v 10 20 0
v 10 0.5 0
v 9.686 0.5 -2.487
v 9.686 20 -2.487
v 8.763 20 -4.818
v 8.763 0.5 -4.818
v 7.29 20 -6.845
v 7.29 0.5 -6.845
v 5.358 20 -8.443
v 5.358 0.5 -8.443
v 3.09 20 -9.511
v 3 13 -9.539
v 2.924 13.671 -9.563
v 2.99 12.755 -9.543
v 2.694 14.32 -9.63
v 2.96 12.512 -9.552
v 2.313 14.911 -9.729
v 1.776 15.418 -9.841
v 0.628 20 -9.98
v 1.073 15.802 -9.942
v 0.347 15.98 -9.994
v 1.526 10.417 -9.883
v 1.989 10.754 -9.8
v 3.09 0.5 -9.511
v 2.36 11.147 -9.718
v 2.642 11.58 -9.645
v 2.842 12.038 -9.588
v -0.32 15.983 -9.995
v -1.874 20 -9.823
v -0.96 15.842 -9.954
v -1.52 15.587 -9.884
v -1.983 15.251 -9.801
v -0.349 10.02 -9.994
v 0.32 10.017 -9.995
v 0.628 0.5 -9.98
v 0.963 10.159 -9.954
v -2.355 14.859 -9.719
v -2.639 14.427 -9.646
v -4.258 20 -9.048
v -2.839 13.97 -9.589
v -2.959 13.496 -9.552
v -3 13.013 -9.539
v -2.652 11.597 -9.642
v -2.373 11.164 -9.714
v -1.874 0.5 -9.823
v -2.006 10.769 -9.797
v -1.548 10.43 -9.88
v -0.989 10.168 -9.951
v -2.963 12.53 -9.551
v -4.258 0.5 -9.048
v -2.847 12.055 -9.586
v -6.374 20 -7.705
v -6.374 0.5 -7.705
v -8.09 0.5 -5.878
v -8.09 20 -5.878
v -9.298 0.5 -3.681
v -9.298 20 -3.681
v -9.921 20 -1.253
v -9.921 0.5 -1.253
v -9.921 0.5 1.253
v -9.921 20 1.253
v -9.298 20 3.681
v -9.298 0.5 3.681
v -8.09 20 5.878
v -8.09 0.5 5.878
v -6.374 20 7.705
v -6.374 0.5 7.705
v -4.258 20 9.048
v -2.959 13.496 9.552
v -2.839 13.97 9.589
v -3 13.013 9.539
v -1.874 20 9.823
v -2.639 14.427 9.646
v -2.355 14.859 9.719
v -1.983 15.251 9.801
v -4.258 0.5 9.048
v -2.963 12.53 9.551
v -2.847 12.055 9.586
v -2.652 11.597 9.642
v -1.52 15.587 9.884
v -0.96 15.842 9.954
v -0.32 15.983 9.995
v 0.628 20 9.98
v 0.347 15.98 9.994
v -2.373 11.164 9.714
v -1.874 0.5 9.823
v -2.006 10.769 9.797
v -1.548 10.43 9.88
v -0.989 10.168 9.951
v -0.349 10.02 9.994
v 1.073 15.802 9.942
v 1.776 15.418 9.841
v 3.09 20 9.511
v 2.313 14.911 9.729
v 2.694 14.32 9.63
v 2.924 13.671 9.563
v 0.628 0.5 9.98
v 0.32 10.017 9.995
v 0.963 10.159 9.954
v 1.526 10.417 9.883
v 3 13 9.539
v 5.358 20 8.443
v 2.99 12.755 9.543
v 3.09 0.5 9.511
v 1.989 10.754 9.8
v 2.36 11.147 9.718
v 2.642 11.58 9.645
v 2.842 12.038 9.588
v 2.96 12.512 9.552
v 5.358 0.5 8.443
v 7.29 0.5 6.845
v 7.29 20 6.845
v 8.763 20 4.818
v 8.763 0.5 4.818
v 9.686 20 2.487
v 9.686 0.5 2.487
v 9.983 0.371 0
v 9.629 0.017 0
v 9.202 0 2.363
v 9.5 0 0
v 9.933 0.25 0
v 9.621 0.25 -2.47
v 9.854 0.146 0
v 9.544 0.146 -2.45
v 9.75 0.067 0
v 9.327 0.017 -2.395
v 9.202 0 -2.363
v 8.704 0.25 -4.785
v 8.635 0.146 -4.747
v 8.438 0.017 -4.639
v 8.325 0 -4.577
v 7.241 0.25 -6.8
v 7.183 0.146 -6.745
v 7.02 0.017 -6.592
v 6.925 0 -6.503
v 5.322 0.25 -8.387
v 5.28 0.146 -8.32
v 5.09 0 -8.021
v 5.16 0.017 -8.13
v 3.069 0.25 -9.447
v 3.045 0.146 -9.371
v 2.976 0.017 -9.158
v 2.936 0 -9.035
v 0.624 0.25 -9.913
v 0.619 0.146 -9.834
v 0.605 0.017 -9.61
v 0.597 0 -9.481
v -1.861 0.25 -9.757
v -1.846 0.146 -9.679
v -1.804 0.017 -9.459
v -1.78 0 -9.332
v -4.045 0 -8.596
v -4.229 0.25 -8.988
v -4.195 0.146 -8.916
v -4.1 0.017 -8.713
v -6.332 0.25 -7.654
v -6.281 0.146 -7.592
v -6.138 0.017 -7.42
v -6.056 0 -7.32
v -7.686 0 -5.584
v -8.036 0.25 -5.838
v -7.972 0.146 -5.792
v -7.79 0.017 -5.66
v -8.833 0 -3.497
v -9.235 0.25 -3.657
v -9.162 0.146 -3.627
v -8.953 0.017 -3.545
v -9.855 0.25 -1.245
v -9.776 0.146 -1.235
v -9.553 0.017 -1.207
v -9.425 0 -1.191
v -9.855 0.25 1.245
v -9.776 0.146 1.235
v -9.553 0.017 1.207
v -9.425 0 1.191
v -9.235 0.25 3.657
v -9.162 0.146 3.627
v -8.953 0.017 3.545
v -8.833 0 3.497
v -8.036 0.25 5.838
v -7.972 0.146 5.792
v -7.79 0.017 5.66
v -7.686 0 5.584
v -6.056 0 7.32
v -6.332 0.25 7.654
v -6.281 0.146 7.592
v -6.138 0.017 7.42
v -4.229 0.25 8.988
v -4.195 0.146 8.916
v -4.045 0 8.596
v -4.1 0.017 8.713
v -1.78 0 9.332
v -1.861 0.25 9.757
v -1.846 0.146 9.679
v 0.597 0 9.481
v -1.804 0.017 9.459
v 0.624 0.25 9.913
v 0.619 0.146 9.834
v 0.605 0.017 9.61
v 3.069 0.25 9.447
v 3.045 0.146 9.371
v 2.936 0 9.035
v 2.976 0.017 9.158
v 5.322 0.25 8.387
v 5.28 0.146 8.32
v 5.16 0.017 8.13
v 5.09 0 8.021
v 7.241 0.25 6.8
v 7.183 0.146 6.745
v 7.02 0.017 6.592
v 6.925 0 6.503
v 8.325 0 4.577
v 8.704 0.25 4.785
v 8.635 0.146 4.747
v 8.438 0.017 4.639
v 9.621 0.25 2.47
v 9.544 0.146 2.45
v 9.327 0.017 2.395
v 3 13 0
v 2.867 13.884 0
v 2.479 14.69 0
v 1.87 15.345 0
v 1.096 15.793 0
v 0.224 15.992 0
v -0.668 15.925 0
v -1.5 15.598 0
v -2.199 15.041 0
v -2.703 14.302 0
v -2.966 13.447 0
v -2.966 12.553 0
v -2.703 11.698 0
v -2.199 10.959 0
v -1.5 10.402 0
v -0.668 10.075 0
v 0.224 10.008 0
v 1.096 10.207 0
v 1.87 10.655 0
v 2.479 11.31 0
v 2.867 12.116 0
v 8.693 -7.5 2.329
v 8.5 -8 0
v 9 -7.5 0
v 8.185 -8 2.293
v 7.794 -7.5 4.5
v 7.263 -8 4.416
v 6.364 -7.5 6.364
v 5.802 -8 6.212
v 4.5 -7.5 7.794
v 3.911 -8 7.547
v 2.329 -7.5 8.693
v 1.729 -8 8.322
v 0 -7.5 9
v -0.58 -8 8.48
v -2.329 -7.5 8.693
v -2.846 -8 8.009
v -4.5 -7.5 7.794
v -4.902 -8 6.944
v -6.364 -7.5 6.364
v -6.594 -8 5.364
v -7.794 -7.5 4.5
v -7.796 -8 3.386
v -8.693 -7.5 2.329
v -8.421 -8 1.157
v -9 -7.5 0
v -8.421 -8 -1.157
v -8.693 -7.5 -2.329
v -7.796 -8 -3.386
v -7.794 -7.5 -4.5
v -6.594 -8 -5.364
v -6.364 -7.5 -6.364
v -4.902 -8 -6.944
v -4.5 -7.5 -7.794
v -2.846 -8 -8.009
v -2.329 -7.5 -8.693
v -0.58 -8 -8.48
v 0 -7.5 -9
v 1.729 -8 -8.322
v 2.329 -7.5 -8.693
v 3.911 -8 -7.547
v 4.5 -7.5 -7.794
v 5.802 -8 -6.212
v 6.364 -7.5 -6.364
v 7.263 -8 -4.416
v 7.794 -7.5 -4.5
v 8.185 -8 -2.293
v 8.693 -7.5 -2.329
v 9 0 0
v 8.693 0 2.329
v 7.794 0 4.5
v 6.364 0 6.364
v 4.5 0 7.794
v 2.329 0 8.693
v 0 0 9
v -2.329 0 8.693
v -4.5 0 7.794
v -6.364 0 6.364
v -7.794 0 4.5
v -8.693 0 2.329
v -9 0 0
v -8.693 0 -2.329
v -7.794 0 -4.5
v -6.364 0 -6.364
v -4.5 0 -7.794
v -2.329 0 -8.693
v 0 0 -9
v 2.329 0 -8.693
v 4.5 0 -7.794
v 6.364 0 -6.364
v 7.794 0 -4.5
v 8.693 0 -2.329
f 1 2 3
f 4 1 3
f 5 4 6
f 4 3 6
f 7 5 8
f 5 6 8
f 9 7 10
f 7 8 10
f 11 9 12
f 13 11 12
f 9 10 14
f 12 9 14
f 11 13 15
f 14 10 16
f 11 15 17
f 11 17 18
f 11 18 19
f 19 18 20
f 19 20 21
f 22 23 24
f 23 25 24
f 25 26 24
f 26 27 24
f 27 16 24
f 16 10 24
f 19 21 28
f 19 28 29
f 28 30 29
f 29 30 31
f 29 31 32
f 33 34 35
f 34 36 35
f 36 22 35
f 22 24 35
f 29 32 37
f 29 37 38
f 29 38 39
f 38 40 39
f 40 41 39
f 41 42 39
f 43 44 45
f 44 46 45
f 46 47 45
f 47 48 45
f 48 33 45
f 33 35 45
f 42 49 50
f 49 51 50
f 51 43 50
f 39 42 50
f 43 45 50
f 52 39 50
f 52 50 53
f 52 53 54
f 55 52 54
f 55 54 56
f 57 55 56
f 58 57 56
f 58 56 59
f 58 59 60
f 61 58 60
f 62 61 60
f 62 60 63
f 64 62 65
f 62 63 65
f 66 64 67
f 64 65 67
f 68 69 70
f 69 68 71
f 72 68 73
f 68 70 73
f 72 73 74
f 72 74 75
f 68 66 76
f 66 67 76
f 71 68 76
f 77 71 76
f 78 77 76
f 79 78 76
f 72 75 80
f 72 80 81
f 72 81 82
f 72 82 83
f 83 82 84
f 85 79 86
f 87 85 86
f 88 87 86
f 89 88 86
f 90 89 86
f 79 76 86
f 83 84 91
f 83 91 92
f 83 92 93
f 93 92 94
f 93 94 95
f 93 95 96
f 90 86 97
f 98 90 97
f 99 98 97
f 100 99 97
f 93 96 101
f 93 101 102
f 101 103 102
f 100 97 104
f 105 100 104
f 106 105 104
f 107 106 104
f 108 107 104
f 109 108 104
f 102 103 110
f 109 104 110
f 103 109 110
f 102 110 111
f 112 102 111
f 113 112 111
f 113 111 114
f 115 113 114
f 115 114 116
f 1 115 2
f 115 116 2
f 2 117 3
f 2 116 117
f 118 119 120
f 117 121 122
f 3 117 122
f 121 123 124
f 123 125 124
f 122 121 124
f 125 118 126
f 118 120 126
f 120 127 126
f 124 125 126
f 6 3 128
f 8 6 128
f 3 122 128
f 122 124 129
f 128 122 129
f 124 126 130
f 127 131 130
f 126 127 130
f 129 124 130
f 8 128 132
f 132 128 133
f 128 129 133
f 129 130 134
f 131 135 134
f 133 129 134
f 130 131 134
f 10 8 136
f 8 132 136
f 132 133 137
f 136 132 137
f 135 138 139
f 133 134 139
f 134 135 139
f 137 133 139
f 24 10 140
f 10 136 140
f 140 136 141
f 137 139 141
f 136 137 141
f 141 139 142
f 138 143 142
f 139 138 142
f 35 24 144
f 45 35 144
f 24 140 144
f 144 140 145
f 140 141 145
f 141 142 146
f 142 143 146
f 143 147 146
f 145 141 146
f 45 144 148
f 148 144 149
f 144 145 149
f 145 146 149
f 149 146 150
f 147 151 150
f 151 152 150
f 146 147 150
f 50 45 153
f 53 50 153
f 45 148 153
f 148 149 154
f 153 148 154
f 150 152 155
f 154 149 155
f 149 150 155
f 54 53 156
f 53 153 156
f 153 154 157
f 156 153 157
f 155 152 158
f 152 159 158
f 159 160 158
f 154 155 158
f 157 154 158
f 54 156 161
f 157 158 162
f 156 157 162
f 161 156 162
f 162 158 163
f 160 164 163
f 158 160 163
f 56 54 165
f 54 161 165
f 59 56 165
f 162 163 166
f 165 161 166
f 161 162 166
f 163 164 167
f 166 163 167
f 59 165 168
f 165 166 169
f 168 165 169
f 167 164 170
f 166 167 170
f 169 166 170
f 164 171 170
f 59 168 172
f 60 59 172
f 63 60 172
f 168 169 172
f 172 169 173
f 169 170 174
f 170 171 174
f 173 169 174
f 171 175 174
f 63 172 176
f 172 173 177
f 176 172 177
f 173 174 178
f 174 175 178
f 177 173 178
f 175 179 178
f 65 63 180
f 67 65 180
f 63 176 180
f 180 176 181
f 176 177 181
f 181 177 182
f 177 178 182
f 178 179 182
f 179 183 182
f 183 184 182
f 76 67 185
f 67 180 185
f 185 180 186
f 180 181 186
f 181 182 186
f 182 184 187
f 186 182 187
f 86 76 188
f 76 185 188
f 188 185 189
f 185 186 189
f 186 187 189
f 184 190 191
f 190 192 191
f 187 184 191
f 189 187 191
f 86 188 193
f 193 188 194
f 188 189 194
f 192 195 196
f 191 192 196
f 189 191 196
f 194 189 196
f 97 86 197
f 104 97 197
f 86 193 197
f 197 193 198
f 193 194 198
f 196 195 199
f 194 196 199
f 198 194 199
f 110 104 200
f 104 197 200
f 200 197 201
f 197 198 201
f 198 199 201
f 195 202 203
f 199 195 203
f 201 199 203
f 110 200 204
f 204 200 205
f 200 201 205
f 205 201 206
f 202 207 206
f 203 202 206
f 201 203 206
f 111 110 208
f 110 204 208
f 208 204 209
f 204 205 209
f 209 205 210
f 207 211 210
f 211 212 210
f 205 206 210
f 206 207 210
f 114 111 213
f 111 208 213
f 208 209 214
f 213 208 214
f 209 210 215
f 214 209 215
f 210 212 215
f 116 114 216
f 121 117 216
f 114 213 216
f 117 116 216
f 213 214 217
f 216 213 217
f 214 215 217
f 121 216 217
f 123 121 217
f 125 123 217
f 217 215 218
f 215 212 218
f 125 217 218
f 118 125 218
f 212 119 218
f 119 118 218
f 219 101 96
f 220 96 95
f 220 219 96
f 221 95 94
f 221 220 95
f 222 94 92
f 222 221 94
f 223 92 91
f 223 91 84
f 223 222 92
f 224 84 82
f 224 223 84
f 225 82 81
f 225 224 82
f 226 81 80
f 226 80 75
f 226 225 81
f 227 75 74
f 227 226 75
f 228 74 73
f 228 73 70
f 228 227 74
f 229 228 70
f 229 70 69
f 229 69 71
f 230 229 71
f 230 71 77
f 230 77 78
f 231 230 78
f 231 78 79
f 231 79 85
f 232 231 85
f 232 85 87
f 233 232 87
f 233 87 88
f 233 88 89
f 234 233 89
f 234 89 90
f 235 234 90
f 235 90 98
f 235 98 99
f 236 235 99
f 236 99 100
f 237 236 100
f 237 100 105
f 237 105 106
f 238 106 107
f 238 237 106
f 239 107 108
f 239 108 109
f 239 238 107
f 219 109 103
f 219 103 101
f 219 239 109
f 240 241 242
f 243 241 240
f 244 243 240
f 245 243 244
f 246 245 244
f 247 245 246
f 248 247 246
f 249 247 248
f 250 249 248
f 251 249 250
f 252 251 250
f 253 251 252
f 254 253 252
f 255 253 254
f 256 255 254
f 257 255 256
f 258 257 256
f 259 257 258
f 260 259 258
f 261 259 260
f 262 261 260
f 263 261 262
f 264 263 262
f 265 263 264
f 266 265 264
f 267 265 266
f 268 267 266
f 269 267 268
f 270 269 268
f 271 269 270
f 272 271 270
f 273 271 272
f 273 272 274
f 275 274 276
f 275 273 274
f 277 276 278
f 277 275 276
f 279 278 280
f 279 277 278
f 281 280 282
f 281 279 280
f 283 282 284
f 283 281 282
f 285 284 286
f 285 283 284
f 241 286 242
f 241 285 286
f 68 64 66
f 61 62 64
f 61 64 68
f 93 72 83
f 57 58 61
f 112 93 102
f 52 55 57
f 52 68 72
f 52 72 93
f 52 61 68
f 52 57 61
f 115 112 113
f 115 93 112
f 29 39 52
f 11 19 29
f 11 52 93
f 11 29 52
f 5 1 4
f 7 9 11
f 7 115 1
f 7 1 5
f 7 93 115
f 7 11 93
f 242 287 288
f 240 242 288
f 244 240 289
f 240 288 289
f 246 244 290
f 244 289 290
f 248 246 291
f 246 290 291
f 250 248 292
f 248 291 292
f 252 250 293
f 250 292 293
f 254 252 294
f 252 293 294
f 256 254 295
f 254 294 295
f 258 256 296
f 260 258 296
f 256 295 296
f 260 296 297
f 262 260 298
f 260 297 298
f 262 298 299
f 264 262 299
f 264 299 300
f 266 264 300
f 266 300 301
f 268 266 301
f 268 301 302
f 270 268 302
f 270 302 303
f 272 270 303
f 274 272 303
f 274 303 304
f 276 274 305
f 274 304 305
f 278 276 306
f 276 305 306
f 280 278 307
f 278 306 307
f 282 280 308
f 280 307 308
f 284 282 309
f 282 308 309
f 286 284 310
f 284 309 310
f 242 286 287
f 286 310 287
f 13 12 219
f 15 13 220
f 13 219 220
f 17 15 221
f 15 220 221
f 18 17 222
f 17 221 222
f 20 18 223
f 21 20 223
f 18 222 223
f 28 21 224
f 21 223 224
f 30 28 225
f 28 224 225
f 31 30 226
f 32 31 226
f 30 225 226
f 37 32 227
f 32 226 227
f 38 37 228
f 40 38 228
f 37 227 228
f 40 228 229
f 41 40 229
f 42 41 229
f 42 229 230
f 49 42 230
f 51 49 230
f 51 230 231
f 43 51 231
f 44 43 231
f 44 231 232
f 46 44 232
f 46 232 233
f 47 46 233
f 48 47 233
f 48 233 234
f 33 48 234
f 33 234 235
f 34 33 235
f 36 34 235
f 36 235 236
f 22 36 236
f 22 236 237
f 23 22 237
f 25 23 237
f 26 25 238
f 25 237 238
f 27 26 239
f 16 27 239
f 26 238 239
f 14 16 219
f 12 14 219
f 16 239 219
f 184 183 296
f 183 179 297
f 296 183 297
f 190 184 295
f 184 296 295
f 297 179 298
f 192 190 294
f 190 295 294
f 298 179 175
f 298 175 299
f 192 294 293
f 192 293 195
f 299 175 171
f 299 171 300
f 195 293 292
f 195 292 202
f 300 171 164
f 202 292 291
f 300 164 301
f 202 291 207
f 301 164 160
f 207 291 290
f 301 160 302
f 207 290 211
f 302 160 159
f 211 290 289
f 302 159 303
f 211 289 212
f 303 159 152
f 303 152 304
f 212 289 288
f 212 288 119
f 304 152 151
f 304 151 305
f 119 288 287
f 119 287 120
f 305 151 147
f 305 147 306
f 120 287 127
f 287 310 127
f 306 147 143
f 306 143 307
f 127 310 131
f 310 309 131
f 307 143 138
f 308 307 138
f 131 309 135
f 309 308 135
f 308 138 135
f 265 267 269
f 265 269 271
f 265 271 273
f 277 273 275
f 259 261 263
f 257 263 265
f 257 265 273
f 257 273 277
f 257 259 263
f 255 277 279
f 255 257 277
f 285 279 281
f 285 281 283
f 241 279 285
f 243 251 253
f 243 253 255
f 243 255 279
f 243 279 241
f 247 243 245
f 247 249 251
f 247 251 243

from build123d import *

# Parameters (mm, degrees)
SKETCH_1_R               = 10
EXTRUDE_1_DEPTH          = 20
SKETCH_2_R               = 9
EXTRUDE_2_DEPTH          = 8
SKETCH_3_R               = 3
CUT_EXTRUDE_1_DEPTH      = 11
CUT_EXTRUDE_1_DEPTH_BACK = 11
FILLET_1_R               = 0.5
CHAMFER_1_SIZE           = 0.5


with BuildPart() as part:
    # 草图1 → 凸台-拉伸1 (new body)
    with BuildSketch(Plane(origin=(0, 0, 0), x_dir=(1, 0, 0), z_dir=(0, 1, 0))):
        Circle(SKETCH_1_R)
    extrude(amount=EXTRUDE_1_DEPTH)

    # 草图2 → 凸台-拉伸2 (add)
    with BuildSketch(Plane.XZ):
        Circle(SKETCH_2_R)
    extrude(amount=EXTRUDE_2_DEPTH)

    # 草图3 → 切除-拉伸1 (cut, two sides)
    with BuildSketch(Plane.XY) as cut_extrude_1_sk:
        with Locations((0, 13)):
            Circle(SKETCH_3_R)
    extrude(amount=CUT_EXTRUDE_1_DEPTH, mode=Mode.SUBTRACT)
    extrude(cut_extrude_1_sk.sketch, amount=-CUT_EXTRUDE_1_DEPTH_BACK, mode=Mode.SUBTRACT)

    # 圆角1
    fillet_1_edges = [part.edges().sort_by_distance(p)[0] for p in [
        (-10, 0, 0),
    ]]
    fillet(fillet_1_edges, radius=FILLET_1_R)

    # 倒角1
    chamfer_1_edges = [part.edges().sort_by_distance(p)[0] for p in [
        (-9, -8, 0),
    ]]
    chamfer(chamfer_1_edges, length=CHAMFER_1_SIZE)


solid = part.part
